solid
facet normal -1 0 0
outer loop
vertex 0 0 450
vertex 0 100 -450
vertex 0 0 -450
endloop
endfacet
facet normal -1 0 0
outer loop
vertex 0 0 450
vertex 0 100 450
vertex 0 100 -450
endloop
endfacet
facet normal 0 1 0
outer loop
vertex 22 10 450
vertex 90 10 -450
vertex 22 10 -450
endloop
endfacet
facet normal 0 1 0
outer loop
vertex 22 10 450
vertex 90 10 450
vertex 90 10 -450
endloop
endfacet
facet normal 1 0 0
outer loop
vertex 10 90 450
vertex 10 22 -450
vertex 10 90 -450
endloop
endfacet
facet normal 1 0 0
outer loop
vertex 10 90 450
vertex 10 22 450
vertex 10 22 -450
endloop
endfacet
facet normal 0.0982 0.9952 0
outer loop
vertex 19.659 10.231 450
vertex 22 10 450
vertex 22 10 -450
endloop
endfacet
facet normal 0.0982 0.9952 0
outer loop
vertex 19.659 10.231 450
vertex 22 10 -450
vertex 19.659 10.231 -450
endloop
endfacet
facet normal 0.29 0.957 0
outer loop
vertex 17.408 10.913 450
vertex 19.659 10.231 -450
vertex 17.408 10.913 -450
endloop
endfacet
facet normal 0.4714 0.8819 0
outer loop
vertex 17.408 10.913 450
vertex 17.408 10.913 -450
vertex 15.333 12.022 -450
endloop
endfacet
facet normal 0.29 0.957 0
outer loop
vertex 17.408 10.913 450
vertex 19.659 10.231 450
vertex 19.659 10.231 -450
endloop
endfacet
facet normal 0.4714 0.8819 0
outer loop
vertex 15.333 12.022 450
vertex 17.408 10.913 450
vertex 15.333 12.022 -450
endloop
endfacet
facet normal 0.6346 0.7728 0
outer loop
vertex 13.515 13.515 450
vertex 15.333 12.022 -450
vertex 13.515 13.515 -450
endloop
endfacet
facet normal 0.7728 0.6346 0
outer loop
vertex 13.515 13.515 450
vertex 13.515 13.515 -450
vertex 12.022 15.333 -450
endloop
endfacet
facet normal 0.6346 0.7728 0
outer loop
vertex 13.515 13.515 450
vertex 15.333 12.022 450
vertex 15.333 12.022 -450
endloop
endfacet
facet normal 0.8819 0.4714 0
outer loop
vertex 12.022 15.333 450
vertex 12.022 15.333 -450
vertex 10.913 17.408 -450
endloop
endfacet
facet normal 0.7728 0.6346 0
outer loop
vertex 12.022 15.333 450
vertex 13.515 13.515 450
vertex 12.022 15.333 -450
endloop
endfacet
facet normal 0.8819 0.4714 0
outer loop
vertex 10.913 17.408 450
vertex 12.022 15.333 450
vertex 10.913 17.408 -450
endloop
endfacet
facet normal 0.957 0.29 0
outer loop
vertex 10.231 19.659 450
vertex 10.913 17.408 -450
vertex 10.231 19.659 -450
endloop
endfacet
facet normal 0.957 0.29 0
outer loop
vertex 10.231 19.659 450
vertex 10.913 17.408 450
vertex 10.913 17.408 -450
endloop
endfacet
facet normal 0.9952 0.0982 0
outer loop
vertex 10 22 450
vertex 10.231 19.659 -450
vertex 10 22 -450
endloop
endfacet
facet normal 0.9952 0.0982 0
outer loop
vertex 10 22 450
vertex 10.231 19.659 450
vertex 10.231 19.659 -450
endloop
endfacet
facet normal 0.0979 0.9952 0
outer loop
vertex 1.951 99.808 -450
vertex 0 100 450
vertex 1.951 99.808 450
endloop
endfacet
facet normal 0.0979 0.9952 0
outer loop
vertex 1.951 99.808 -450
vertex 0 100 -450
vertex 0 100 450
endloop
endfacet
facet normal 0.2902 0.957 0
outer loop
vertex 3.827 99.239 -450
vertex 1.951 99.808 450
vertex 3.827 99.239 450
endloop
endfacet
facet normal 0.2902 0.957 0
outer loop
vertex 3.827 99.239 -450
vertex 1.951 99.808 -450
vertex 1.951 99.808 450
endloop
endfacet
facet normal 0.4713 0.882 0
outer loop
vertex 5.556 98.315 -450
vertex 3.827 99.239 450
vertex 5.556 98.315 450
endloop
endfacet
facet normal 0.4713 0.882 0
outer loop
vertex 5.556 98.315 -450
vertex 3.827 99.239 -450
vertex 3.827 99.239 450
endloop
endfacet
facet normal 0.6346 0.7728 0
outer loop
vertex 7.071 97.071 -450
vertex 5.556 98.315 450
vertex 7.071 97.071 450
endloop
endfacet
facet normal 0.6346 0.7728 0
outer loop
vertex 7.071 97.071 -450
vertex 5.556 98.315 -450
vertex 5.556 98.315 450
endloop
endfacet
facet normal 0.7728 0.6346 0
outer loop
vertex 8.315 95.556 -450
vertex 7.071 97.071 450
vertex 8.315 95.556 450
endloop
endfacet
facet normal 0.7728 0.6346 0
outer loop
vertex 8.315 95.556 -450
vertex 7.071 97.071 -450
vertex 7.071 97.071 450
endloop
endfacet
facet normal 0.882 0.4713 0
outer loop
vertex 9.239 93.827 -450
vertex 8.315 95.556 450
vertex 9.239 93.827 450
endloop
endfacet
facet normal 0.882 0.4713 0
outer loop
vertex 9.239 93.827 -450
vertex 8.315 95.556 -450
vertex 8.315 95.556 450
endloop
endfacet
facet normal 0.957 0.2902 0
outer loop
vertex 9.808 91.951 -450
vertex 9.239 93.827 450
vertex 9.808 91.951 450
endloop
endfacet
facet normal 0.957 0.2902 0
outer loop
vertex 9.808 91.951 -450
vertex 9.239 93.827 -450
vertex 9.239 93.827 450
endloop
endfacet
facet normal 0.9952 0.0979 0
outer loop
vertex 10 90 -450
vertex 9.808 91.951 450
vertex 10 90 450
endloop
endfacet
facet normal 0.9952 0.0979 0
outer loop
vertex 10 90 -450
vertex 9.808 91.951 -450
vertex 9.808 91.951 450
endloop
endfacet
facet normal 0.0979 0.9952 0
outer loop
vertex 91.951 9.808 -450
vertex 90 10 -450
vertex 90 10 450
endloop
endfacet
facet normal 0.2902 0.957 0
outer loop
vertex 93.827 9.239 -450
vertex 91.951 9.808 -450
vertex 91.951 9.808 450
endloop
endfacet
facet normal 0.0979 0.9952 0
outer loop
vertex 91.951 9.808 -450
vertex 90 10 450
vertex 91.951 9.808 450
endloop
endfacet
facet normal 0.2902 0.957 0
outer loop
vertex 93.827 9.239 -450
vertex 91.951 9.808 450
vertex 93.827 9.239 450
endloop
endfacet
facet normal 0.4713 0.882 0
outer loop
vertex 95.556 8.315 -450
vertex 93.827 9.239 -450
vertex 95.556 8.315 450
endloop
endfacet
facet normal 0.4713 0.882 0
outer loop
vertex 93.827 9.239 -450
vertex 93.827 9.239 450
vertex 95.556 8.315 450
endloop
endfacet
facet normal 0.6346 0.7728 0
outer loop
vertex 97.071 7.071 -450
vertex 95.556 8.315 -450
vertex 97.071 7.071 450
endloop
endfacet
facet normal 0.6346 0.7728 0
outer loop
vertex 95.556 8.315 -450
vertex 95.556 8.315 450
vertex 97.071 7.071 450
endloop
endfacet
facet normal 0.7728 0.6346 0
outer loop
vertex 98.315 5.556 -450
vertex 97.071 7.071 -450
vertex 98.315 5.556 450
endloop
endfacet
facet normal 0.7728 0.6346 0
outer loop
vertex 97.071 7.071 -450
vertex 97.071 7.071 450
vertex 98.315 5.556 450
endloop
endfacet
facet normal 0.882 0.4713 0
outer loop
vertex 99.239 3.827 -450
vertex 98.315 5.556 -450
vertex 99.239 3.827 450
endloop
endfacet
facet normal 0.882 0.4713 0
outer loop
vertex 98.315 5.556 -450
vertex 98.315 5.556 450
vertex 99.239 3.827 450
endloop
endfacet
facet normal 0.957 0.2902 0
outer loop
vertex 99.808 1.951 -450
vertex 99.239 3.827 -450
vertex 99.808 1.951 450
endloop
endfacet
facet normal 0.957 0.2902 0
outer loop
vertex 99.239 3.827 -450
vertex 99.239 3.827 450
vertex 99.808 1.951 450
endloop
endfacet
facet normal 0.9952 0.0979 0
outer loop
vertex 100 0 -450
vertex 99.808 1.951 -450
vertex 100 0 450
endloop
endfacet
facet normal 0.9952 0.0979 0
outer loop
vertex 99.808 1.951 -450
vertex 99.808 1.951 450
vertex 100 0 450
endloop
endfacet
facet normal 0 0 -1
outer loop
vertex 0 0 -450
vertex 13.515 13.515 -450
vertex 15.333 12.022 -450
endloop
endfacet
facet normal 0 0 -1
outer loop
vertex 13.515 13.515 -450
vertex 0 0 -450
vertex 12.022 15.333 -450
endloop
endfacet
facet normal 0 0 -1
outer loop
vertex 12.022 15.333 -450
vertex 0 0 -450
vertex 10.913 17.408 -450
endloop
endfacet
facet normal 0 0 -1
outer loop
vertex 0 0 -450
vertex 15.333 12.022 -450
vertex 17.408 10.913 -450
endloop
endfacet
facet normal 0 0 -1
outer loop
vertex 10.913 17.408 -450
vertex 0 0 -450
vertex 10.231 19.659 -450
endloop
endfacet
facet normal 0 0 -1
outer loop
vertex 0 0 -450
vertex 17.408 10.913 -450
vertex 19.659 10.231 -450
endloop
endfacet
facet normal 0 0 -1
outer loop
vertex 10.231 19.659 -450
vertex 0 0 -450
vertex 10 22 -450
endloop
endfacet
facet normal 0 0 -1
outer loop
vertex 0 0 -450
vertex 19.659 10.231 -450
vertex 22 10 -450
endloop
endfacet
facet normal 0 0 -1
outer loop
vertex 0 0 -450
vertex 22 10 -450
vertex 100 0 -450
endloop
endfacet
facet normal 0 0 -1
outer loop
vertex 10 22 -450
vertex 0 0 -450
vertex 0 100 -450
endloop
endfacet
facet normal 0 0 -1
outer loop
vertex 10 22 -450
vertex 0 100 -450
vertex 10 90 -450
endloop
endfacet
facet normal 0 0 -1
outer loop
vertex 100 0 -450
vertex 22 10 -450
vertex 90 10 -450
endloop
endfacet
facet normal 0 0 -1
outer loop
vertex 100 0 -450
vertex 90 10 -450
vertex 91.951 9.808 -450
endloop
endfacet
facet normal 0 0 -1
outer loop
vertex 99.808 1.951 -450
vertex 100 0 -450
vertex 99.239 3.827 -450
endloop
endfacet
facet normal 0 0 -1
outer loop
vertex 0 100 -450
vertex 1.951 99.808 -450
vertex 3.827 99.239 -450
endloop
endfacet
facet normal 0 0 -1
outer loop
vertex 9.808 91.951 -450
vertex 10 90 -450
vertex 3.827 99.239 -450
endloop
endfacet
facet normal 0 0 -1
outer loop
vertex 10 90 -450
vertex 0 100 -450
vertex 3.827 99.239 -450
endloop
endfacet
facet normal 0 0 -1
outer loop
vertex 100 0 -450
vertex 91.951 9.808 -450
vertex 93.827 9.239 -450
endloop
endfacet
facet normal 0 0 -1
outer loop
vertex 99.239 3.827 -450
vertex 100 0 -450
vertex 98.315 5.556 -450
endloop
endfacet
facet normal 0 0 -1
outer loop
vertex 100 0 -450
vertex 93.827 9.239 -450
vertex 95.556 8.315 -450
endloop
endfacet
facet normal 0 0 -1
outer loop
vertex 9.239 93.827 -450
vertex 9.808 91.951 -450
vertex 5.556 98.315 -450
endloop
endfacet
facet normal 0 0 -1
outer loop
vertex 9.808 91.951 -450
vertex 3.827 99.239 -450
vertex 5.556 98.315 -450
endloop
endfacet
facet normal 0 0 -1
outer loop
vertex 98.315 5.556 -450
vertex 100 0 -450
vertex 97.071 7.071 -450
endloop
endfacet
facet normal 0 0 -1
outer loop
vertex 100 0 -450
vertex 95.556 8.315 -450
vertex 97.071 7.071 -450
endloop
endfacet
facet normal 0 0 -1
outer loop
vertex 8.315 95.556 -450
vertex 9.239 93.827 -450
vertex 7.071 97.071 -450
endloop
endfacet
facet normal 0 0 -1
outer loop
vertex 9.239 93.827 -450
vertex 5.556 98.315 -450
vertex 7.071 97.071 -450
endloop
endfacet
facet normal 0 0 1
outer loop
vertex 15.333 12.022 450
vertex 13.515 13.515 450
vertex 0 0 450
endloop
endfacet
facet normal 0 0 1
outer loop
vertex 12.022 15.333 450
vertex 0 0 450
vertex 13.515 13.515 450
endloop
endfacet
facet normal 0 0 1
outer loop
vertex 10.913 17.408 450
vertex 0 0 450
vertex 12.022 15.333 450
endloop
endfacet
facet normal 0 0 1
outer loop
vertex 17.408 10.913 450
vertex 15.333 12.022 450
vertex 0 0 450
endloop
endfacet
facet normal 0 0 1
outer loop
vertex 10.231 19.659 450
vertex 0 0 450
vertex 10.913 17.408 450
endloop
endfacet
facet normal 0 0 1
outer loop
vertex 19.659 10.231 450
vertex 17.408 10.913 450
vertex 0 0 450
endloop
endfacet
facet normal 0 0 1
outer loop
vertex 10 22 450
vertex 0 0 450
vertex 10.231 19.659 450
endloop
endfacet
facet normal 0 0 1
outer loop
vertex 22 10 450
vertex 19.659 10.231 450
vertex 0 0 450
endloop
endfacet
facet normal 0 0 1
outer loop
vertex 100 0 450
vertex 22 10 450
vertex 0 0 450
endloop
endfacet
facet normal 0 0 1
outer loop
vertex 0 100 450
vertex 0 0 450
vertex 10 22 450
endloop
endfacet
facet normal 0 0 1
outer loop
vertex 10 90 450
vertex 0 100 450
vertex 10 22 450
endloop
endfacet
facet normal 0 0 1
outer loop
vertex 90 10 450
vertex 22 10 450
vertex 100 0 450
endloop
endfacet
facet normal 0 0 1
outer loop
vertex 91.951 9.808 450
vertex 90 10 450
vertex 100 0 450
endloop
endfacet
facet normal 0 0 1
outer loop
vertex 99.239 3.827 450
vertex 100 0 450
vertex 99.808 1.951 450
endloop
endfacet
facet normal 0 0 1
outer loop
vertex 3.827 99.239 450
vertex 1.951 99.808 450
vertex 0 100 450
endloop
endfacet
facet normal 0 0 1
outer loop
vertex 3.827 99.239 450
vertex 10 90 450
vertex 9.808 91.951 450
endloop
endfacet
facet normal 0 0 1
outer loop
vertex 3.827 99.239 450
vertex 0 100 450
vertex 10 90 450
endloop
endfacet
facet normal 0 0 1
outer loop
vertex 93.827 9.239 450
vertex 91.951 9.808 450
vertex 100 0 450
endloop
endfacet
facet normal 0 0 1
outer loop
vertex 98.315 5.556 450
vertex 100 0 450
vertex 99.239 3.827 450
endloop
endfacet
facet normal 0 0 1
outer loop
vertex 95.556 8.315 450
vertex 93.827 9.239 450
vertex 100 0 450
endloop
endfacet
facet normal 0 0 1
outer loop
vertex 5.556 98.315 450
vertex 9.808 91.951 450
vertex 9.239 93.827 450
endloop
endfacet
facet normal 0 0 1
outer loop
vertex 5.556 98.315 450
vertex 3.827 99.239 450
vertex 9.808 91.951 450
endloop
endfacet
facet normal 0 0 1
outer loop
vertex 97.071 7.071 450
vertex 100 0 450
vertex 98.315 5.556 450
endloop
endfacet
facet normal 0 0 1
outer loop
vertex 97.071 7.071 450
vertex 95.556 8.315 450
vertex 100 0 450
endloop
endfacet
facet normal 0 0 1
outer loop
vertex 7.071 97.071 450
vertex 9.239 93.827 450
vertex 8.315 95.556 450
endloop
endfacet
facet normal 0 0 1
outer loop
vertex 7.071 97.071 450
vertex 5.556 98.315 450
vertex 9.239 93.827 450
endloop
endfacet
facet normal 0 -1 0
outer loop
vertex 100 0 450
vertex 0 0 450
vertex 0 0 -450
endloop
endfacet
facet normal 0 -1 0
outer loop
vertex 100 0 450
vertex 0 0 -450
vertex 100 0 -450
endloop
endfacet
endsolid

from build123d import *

# Parameters (mm, degrees)
BASESTEELANGLE_DEPTH = 450
TOEFILLET_R          = 10


with BuildPart() as part:
    # Sketch1 → BaseSteelAngle (new, symmetric)
    with BuildSketch(Plane.XY):
        with BuildLine():
            Line((0, 100), (0, 0))
            Line((0, 0), (100, 0))
            Line((100, 0), (100, 10))
            Line((100, 10), (22, 10))
            ThreePointArc((22, 10), (13.514718626, 13.514718626), (10, 22))
            Line((10, 22), (10, 100))
            Line((10, 100), (0, 100))
        make_face()
    extrude(amount=BASESTEELANGLE_DEPTH, both=True)

    # ToeFillet
    toefillet_edges = [part.edges().sort_by_distance(p)[0] for p in [
        (10, 100, 0),
        (100, 10, 0),
    ]]
    fillet(toefillet_edges, radius=TOEFILLET_R - 0.0001)  # a hair under: the kernel refuses the full size


solid = part.part
